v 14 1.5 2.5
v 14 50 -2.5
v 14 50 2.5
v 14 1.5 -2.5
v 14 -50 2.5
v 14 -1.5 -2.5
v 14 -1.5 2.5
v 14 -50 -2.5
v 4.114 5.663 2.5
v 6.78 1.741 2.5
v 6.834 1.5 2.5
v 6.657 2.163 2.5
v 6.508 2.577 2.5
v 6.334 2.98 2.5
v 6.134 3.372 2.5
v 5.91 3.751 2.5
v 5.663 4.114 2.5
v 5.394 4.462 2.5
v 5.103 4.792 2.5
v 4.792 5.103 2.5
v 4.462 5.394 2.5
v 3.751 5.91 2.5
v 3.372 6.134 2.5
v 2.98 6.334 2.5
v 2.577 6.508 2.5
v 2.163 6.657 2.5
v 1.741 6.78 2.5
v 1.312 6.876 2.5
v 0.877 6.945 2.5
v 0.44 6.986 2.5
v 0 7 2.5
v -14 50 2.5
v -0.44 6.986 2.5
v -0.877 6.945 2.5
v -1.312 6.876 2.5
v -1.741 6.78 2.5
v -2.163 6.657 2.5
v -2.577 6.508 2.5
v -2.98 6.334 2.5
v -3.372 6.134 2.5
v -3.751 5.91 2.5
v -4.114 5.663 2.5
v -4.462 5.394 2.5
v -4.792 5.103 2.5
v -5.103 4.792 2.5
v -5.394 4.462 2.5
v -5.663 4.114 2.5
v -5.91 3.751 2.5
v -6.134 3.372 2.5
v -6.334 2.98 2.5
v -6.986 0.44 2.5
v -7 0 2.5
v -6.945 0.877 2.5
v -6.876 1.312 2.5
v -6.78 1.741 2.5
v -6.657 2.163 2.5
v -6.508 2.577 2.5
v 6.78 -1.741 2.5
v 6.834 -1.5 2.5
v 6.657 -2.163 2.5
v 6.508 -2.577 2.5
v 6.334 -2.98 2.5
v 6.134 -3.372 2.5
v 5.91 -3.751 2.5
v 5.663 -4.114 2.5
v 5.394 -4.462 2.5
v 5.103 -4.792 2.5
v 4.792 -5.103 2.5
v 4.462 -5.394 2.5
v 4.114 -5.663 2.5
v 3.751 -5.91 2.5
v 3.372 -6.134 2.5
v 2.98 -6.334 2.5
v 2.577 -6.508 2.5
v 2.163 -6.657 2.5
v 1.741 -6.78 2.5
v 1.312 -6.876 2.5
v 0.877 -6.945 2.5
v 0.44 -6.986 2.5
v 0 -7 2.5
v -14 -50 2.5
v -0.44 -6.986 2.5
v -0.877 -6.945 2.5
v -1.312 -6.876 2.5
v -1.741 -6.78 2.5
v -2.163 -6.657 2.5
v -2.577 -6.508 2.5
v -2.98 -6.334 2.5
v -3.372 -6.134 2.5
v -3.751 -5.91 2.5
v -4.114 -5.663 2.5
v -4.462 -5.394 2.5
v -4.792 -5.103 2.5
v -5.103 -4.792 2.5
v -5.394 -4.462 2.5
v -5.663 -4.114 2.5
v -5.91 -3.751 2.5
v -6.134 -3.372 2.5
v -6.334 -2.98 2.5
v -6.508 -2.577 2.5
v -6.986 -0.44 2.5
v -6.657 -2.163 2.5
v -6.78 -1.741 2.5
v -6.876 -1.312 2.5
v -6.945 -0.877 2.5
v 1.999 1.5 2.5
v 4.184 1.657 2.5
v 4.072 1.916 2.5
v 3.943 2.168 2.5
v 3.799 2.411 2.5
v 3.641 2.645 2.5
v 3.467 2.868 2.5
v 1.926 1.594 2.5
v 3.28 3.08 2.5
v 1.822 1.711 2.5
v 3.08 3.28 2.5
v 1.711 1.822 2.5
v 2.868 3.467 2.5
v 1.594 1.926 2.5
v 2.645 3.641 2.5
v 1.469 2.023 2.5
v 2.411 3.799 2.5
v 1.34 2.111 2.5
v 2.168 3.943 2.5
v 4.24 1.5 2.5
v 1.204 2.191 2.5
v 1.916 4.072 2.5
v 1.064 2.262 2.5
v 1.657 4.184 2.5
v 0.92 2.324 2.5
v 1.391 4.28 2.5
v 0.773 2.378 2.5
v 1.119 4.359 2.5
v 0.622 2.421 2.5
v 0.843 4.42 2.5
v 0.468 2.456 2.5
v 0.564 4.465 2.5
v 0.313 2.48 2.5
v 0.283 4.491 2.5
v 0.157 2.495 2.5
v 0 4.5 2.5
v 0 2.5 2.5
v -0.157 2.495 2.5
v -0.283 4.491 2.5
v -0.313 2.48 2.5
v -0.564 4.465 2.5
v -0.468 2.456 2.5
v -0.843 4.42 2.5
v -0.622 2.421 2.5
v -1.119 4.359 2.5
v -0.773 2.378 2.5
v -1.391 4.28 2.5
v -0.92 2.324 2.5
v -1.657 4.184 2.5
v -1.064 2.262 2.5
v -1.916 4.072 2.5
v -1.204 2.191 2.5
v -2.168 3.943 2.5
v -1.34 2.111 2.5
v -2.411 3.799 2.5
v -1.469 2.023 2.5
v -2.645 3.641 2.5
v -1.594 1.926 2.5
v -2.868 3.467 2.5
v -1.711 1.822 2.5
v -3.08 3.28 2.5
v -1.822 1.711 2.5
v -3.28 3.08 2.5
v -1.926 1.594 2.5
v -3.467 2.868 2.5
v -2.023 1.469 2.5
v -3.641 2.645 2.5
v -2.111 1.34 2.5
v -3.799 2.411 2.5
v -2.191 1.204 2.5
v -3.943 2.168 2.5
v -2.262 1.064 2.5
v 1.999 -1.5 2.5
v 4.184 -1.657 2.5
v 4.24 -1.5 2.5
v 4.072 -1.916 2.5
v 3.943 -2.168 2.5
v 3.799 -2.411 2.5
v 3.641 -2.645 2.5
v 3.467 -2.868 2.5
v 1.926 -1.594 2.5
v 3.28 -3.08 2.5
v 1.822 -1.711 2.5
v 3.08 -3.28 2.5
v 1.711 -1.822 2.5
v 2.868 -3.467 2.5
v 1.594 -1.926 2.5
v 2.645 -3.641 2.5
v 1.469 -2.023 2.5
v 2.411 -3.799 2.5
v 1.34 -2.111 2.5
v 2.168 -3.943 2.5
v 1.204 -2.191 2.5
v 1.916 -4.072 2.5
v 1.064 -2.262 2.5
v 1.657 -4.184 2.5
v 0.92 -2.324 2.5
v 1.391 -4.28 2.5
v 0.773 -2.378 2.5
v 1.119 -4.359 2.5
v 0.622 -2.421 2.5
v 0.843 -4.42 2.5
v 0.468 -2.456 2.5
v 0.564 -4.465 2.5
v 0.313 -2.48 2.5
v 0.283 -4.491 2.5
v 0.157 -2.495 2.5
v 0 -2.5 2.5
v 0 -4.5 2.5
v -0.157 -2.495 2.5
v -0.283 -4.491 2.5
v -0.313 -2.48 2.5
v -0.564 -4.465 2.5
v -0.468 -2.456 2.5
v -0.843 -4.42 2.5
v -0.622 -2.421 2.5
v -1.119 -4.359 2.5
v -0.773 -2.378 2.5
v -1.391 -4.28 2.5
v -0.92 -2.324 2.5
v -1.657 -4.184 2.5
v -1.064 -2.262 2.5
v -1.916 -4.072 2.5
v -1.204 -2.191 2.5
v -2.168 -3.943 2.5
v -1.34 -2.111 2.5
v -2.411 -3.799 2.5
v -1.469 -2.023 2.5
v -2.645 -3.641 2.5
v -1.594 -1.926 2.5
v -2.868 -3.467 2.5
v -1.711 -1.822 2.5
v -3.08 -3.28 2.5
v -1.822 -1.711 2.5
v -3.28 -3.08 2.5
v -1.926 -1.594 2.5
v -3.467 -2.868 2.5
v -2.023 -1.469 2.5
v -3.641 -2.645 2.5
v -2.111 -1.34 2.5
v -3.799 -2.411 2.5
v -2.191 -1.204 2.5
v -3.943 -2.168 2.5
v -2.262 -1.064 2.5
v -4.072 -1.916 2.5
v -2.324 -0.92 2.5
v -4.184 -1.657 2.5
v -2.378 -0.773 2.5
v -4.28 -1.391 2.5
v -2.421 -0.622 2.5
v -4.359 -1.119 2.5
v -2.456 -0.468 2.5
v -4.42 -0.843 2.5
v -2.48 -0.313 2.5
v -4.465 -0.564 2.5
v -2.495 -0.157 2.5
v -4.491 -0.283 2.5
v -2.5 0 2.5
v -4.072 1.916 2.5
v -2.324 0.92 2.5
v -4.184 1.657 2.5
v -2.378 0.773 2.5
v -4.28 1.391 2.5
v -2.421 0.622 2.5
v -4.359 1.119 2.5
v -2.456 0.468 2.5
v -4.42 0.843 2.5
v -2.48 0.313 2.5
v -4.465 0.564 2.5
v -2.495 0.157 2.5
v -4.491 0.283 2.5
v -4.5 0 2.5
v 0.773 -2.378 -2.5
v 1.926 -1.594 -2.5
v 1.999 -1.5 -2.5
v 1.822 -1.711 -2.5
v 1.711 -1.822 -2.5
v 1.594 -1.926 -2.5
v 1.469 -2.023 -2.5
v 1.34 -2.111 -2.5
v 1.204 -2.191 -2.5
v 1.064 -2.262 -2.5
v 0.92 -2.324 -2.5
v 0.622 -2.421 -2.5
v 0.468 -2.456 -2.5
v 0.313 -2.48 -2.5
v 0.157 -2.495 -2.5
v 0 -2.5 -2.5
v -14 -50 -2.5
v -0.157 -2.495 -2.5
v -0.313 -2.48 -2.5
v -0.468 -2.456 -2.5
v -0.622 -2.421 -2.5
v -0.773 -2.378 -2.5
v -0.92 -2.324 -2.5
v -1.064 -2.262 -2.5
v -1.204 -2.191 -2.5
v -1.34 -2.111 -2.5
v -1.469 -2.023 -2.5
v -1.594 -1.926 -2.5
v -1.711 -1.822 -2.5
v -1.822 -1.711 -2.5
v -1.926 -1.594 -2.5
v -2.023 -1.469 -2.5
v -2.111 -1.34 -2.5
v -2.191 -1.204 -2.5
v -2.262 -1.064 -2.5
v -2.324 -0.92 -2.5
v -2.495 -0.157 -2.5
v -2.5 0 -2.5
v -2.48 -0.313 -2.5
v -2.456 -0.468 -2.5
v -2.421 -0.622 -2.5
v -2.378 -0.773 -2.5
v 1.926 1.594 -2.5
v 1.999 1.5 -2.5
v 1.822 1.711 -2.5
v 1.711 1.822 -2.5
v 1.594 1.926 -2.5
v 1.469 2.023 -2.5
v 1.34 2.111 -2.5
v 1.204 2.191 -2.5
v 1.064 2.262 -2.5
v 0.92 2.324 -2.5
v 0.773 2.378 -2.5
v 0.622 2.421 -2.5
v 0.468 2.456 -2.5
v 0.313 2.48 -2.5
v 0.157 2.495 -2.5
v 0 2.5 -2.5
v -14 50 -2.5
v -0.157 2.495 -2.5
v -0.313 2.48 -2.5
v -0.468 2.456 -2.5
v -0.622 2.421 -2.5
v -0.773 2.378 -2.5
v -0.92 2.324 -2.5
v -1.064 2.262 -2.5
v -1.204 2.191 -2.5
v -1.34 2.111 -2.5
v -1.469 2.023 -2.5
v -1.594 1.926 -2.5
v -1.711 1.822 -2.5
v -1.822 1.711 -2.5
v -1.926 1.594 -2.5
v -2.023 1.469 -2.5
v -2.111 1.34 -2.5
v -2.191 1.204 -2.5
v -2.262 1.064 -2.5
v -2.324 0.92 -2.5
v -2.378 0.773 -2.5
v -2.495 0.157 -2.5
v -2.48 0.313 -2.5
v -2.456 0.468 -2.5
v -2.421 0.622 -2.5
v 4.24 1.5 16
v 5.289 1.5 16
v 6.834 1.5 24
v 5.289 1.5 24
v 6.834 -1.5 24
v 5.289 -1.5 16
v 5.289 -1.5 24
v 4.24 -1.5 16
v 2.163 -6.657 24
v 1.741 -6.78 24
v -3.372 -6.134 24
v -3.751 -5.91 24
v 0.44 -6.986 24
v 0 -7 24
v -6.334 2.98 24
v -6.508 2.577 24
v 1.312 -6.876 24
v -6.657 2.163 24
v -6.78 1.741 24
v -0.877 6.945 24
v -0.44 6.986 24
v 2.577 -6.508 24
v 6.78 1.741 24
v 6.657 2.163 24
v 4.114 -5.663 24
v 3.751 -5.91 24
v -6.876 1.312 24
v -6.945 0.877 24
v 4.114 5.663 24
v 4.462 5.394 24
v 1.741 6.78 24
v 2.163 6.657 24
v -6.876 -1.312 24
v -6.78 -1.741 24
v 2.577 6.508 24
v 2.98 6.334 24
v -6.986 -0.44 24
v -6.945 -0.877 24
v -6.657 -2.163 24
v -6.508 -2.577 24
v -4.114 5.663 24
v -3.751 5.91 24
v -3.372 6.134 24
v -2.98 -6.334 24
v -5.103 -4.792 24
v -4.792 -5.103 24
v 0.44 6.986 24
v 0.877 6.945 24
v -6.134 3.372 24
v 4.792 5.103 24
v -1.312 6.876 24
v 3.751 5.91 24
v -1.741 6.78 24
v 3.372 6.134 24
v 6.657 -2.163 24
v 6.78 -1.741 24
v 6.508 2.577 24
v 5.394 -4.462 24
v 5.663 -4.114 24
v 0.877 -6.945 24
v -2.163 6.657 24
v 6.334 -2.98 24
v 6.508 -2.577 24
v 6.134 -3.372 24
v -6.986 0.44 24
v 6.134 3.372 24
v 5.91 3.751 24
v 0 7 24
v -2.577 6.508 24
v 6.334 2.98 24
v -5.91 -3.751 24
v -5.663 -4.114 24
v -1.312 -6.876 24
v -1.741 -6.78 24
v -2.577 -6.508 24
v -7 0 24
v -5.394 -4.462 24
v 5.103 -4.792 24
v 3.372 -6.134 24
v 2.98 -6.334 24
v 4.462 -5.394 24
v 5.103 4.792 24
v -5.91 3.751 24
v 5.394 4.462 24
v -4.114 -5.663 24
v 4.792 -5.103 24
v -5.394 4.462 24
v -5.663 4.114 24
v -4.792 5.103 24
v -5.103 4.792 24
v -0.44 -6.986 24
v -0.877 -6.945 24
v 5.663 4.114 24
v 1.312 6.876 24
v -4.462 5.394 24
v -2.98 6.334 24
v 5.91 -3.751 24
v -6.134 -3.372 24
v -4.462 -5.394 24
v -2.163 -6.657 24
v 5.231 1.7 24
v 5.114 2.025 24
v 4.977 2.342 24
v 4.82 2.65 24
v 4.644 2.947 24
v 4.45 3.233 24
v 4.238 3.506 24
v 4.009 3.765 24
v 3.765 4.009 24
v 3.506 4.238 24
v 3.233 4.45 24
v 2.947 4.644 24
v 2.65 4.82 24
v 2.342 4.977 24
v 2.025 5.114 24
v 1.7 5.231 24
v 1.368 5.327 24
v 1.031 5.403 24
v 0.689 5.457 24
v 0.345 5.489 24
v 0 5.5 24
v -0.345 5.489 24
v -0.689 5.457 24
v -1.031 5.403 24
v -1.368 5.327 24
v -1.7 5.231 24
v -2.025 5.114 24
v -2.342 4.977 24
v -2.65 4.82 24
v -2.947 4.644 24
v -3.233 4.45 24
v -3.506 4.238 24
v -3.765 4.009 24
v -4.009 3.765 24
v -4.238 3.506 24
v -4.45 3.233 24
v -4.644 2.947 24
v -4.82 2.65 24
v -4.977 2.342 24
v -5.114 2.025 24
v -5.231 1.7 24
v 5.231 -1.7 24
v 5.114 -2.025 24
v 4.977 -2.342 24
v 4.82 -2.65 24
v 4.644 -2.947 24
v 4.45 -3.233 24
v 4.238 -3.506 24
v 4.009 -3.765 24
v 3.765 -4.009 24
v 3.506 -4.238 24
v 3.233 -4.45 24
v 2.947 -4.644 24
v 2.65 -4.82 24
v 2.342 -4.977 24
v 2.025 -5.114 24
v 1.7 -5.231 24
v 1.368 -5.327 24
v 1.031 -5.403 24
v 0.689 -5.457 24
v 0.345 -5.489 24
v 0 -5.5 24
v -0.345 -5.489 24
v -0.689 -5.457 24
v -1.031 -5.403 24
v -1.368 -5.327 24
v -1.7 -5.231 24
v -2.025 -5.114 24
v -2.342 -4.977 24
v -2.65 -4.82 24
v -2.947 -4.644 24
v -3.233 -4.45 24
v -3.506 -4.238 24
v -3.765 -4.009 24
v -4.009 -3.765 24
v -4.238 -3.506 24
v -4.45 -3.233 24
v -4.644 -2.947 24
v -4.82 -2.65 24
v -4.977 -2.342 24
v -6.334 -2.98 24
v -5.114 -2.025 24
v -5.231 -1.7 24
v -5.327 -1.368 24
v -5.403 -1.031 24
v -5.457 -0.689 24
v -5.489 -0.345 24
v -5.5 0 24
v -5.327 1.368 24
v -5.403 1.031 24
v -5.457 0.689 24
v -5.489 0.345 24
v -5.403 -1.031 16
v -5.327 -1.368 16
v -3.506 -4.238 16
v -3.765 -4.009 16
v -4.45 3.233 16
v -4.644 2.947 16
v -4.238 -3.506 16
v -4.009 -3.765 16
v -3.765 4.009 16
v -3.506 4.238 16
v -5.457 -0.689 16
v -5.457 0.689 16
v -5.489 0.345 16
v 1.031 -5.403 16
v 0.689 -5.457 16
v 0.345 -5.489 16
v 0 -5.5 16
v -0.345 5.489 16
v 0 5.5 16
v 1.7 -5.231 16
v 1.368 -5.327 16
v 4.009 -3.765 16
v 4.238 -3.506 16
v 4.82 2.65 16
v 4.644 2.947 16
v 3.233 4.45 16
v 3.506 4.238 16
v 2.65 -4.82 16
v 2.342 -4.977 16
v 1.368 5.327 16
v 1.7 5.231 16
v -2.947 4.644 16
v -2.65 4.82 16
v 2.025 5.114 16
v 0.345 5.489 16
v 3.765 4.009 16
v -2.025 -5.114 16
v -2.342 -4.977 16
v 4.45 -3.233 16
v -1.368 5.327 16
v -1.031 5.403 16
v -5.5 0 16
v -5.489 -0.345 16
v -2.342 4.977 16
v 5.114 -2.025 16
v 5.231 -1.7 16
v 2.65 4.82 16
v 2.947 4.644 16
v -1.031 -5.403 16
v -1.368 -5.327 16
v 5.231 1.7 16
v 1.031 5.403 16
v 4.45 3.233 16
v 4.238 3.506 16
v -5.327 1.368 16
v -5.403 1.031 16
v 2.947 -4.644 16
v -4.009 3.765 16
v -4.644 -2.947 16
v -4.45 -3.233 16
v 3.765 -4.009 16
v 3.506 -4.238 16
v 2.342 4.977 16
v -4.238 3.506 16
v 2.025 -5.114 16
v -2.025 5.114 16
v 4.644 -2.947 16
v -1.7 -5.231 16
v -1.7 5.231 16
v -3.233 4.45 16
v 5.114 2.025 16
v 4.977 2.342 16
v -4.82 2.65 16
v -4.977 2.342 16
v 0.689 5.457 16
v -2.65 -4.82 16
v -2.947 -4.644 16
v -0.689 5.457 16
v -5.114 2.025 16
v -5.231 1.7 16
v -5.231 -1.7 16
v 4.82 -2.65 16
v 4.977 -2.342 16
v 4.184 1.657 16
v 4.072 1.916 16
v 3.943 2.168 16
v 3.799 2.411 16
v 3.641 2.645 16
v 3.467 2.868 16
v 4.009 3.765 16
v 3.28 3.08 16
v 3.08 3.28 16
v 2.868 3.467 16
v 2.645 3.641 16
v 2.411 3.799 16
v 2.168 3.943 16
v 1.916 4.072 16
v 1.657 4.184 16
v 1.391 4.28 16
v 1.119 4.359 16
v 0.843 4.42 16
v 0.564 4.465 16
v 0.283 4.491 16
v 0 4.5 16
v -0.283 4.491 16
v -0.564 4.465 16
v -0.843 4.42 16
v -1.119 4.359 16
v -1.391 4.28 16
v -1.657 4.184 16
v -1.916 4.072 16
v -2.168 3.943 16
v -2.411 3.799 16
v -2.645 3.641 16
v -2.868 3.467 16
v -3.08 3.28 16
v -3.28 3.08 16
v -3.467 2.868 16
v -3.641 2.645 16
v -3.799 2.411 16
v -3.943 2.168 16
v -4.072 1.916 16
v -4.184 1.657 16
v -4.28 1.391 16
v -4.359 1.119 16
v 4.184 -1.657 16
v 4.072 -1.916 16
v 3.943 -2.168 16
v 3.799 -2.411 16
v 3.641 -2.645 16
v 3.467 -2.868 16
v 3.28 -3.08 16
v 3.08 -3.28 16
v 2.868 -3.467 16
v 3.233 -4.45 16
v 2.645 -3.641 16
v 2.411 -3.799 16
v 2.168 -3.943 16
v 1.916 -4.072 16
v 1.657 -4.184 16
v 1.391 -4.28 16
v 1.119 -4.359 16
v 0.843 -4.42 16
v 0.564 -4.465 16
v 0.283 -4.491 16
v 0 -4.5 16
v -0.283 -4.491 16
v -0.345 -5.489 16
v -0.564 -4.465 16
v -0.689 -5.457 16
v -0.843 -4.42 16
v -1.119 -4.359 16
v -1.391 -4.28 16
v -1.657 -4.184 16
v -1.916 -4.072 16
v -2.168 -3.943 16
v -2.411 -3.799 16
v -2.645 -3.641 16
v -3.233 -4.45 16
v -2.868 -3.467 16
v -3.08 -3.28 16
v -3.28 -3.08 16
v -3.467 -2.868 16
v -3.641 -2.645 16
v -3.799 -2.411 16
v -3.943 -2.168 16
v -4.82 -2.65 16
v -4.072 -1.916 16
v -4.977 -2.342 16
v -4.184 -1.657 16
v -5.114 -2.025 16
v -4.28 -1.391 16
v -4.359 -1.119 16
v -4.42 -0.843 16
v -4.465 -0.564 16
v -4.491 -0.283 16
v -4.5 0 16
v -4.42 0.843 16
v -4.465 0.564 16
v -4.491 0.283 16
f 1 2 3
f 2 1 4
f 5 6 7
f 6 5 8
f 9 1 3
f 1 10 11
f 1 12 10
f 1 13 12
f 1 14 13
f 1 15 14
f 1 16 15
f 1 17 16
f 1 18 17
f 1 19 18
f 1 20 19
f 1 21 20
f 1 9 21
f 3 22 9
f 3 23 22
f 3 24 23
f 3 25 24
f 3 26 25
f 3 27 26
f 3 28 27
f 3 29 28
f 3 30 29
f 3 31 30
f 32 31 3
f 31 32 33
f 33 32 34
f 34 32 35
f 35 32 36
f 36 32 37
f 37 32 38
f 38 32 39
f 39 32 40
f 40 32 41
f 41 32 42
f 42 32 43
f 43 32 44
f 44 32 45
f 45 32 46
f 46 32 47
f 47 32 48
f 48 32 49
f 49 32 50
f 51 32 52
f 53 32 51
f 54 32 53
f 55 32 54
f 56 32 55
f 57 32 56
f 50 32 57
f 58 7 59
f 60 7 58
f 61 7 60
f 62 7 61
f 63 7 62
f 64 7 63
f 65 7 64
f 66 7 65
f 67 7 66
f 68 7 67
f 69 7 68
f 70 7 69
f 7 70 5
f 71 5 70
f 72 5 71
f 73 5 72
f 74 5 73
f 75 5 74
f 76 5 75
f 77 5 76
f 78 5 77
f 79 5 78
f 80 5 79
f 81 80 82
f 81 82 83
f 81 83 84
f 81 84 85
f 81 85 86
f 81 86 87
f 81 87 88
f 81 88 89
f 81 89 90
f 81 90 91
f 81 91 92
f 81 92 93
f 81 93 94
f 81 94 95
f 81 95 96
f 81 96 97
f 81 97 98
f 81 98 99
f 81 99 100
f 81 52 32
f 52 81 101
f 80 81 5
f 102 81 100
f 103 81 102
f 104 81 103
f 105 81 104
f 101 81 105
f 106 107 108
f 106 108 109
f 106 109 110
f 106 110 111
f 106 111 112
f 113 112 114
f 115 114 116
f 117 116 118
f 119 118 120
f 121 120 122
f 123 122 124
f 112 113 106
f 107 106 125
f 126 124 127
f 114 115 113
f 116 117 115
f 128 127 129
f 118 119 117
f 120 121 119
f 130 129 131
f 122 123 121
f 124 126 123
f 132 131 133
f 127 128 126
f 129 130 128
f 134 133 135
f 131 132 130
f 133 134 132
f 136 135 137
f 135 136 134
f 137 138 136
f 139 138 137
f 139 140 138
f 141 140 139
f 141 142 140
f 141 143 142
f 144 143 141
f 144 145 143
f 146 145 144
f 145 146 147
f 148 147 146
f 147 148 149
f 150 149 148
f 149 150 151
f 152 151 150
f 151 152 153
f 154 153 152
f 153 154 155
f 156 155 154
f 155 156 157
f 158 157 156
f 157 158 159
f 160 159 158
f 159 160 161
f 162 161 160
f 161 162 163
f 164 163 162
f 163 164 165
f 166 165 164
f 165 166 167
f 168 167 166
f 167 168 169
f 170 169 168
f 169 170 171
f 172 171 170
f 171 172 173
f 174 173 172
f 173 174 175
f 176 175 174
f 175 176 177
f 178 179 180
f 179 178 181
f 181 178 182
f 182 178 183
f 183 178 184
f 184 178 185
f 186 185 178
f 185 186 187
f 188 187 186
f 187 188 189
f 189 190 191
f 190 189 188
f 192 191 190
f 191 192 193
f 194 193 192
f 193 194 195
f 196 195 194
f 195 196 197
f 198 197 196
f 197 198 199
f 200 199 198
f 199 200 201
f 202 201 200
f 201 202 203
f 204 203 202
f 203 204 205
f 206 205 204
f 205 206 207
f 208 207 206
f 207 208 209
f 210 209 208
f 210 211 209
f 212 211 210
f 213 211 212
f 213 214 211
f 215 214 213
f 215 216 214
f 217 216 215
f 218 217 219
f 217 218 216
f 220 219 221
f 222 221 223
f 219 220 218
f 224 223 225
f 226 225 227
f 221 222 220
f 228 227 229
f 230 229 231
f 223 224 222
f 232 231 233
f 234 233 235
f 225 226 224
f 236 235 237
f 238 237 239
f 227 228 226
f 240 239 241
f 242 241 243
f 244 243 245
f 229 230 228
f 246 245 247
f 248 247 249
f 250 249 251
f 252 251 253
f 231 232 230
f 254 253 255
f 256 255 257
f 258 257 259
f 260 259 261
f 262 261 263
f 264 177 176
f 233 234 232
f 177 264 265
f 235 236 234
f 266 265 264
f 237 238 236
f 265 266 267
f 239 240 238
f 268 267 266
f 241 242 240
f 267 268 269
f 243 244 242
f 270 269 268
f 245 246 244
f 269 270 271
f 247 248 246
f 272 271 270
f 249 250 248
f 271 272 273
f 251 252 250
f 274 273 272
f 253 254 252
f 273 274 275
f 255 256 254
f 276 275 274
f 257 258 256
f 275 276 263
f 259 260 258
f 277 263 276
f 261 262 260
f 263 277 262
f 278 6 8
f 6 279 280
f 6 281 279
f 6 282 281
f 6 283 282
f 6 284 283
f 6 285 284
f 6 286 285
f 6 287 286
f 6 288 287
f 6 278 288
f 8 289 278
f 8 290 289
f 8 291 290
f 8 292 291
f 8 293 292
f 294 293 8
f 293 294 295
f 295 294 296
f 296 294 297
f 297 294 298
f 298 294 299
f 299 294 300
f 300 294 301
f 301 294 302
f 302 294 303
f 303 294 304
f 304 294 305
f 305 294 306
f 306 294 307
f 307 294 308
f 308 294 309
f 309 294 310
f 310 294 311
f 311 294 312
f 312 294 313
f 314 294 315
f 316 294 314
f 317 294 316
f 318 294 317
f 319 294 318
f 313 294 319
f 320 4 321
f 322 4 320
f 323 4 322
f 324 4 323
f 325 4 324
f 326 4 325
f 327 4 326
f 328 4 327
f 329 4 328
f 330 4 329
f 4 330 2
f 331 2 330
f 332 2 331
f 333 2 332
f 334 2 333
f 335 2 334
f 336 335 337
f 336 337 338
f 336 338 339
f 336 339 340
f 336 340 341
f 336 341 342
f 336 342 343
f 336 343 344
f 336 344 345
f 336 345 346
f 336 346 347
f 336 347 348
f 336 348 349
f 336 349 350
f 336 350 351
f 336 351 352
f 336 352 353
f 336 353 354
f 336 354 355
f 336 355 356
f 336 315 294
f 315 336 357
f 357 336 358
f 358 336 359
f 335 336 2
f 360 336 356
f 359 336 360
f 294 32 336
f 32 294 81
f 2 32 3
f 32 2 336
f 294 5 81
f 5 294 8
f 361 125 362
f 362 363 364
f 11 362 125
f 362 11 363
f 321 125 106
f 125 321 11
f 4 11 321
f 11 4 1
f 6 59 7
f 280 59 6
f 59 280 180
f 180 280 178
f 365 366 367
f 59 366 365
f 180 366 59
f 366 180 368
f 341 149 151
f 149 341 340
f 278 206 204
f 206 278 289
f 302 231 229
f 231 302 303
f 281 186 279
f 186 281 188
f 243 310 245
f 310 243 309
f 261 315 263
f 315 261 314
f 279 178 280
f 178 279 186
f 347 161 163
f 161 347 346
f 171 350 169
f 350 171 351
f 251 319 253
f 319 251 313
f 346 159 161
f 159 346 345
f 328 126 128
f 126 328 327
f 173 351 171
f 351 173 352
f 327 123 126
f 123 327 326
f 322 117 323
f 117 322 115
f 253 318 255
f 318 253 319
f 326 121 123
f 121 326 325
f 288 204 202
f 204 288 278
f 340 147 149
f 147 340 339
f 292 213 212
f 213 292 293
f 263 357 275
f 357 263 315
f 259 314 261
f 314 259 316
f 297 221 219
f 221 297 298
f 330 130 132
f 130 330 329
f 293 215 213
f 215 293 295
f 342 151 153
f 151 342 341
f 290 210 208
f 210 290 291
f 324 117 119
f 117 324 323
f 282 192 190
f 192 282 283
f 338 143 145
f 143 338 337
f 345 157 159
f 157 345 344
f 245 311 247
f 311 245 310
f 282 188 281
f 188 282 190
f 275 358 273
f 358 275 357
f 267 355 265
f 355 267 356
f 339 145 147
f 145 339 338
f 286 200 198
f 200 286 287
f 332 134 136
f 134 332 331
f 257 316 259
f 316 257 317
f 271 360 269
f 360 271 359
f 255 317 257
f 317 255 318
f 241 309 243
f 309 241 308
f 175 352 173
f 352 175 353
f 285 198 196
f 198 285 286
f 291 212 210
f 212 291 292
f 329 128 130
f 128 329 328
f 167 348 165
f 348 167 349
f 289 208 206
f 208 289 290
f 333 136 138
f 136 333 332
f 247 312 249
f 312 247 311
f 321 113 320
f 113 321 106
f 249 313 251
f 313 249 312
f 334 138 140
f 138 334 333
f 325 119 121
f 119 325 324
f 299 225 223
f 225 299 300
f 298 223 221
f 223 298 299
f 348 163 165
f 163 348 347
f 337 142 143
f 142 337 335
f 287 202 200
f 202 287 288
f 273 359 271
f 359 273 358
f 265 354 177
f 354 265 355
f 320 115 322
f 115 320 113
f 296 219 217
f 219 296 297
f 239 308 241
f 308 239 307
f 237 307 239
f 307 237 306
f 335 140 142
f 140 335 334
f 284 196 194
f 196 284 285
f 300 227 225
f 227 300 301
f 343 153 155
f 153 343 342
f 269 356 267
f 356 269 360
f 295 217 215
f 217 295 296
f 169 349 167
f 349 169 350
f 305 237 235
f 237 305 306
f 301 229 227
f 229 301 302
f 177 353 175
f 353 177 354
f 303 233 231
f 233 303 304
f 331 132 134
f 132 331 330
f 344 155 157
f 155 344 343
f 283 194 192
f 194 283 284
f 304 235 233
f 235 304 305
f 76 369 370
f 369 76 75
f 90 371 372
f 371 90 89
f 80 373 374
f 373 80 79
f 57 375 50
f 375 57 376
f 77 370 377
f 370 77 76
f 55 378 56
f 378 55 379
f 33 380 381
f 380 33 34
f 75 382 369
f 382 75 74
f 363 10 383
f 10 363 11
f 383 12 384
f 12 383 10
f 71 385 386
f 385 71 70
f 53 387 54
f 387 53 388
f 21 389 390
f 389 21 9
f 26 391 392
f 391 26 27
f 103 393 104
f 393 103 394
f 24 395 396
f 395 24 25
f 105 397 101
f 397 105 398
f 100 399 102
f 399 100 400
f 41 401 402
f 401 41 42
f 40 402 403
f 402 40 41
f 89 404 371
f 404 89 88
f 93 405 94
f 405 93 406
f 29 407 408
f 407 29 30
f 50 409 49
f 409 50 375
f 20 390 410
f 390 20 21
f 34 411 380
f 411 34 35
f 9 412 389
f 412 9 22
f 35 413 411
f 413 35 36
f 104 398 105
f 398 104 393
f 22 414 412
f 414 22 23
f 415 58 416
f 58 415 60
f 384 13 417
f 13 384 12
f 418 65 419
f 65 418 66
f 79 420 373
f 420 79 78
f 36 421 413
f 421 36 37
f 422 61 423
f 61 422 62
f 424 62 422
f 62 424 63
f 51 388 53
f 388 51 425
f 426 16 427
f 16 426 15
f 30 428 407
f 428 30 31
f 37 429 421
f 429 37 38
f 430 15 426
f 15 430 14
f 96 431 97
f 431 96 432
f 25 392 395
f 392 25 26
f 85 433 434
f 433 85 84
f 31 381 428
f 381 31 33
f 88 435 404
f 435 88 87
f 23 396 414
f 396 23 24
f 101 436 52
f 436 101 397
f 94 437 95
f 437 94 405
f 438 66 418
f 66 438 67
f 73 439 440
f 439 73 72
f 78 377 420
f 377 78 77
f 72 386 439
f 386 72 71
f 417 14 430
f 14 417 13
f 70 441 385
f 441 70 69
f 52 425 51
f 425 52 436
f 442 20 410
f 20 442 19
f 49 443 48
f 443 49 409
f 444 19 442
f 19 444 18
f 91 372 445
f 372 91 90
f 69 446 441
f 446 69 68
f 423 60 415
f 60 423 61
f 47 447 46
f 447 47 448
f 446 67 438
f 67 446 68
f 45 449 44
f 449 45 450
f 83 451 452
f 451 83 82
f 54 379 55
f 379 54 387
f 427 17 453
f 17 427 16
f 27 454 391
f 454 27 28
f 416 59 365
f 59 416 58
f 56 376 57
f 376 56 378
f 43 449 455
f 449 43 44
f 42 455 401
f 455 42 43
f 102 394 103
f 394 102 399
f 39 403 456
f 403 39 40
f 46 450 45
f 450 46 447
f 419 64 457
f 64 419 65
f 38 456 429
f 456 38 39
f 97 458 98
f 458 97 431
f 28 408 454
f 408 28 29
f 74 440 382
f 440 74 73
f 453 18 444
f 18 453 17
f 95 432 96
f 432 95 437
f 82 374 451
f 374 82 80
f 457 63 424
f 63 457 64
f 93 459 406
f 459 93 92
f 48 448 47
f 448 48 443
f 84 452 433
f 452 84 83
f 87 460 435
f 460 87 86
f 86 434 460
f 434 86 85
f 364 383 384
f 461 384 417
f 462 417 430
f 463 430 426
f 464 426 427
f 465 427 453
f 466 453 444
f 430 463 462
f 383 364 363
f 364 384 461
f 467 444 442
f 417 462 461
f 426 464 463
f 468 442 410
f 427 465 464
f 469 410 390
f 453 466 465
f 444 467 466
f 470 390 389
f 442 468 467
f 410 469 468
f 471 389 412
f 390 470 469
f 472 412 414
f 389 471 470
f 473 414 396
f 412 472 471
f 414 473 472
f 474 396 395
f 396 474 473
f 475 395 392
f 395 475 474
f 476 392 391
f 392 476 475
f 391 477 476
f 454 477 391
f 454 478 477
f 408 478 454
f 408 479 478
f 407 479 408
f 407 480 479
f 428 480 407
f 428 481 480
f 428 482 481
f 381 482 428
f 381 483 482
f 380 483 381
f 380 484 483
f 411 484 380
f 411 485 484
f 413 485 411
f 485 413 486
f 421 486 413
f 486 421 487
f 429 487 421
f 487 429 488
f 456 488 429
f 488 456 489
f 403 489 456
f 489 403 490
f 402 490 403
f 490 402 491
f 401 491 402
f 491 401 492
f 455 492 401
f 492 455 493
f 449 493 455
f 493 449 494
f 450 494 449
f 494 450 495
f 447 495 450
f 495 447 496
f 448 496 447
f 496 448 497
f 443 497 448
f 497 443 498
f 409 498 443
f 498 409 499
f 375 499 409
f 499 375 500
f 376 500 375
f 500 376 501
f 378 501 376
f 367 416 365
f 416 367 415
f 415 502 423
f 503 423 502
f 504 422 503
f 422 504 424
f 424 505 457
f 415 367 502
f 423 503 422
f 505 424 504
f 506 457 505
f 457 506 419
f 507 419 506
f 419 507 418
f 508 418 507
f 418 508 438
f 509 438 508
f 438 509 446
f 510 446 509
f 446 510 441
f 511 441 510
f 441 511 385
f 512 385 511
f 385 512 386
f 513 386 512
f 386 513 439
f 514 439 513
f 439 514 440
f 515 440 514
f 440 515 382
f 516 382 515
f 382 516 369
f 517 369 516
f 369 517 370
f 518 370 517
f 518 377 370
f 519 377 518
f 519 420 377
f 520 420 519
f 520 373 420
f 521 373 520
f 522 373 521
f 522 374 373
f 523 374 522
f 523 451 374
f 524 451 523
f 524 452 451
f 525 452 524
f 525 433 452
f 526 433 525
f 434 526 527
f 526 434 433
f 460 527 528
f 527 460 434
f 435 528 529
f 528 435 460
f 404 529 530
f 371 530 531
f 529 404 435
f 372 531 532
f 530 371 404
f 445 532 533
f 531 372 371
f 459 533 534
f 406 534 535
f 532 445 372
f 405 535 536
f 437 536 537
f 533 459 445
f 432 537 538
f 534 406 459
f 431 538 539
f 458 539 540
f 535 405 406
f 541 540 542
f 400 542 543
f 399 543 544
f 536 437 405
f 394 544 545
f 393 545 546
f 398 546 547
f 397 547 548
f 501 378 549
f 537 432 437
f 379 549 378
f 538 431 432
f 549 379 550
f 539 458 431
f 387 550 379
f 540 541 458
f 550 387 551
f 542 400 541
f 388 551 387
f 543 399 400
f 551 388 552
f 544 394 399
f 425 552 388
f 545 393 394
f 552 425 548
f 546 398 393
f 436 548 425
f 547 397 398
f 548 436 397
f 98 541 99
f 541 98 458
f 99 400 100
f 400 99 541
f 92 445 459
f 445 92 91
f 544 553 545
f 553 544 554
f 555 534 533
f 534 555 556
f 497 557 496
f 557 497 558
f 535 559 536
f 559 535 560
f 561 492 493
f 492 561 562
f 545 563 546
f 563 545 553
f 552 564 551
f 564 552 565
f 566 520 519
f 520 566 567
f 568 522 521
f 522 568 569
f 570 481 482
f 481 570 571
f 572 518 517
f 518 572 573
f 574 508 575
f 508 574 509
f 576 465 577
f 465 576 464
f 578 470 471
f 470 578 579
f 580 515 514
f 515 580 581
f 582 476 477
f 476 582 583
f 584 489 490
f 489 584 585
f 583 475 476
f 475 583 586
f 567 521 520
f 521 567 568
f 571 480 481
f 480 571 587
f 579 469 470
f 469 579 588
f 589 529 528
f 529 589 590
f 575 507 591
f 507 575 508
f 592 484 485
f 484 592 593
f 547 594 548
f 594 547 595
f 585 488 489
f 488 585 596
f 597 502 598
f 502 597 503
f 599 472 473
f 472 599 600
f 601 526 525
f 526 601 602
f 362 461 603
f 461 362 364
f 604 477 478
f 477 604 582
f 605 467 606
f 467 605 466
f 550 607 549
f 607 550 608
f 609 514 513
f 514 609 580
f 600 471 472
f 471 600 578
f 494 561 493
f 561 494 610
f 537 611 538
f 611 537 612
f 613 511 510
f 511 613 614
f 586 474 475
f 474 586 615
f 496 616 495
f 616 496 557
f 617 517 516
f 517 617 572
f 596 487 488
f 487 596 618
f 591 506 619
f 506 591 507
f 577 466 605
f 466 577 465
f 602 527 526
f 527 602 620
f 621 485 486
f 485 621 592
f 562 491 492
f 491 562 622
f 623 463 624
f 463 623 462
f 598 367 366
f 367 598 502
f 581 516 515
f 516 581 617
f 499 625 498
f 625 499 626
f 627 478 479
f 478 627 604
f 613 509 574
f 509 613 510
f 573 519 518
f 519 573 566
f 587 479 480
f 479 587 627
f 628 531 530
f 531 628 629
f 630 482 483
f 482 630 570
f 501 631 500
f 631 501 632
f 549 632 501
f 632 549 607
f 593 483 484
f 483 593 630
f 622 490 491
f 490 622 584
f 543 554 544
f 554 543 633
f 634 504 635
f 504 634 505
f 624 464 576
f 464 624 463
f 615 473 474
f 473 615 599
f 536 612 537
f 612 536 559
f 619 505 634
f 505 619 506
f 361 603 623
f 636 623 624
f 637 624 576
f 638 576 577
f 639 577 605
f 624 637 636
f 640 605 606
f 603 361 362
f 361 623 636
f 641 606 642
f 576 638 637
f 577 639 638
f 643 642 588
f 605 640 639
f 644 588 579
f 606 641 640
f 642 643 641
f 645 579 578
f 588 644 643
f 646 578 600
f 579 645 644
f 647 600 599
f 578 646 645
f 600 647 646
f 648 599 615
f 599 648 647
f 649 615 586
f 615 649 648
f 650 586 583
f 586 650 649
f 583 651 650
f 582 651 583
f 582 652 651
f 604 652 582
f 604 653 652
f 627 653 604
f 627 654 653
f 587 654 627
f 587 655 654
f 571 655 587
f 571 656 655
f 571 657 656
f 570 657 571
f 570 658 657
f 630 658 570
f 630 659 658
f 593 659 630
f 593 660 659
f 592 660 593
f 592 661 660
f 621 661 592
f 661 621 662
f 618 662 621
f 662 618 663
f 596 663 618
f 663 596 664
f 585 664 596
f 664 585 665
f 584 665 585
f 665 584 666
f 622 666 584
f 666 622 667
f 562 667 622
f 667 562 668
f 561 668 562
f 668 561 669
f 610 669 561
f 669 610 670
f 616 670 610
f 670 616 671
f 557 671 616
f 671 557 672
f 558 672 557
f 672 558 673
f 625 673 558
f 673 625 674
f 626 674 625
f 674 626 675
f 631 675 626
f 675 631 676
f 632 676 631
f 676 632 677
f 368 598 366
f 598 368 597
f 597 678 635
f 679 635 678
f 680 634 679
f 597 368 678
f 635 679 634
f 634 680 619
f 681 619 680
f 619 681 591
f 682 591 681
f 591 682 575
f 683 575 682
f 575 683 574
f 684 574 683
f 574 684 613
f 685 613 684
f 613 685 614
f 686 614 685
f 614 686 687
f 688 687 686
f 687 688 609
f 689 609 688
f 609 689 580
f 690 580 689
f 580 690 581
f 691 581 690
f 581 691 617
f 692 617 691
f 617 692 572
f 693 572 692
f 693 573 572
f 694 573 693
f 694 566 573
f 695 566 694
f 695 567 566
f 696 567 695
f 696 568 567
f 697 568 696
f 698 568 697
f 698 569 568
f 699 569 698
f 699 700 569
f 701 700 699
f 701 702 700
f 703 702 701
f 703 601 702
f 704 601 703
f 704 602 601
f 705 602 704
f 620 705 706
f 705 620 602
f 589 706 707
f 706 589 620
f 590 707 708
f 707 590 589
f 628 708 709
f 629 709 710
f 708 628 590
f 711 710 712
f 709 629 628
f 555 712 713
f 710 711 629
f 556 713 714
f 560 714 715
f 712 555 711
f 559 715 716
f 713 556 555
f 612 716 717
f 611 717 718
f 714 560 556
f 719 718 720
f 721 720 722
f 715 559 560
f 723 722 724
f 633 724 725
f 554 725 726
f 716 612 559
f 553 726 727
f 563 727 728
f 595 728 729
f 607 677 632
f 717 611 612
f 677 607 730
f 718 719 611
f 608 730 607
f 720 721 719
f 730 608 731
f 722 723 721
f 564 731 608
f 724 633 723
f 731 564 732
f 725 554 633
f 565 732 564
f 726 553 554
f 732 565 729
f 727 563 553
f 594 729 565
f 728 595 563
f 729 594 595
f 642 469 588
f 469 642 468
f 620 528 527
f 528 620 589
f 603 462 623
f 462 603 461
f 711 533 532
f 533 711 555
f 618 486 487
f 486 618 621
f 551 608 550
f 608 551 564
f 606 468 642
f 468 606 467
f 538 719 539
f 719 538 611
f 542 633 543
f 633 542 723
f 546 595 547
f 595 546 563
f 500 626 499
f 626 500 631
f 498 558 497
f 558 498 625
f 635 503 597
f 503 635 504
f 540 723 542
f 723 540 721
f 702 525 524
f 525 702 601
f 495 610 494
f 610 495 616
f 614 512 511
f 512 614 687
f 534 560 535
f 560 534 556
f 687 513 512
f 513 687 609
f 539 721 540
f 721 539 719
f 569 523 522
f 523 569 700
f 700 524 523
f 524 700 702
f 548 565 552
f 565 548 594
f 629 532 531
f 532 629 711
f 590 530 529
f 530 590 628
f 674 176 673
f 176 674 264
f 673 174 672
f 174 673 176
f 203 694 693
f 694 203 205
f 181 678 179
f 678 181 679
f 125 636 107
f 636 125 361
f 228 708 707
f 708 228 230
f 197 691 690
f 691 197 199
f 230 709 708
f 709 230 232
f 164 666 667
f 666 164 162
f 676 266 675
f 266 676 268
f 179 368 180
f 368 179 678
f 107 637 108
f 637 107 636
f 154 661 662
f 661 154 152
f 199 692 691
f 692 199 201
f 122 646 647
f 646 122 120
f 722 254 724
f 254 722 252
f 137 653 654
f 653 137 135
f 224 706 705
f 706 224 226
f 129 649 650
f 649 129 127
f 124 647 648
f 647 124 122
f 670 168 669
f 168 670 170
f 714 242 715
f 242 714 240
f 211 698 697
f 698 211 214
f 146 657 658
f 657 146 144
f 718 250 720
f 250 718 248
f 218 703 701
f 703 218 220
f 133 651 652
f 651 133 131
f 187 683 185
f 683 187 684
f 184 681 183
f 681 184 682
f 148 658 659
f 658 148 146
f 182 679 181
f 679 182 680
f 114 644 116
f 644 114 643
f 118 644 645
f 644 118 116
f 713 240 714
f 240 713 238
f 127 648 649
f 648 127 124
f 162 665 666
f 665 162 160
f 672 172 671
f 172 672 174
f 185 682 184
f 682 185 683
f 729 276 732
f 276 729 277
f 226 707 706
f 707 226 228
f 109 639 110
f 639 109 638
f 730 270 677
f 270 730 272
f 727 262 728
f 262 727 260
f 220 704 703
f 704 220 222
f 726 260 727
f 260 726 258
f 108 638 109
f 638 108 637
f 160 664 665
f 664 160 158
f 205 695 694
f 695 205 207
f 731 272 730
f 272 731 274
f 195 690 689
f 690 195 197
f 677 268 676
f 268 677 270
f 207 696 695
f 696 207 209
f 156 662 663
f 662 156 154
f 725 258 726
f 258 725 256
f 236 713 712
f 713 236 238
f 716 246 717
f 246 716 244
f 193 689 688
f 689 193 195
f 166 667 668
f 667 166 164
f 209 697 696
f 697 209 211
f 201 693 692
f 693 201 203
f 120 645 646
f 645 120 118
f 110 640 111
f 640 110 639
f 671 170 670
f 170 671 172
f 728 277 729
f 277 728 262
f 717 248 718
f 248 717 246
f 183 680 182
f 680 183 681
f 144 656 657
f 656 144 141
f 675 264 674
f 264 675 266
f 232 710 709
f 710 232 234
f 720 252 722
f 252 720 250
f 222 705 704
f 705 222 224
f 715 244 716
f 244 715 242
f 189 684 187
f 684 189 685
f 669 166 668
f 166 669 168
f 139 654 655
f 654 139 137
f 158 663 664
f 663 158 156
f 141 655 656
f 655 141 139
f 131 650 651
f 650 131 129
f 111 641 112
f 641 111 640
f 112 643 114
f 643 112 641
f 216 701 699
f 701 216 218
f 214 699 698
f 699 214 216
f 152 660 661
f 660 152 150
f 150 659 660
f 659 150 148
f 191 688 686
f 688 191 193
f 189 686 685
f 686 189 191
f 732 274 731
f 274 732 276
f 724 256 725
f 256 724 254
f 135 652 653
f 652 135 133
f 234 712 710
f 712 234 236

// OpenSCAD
difference(){
cube([28,100,5],center=true);
     translate ([10,0,0]){cube([20,3,100], center=true);}
     cylinder(h=100, r=2.5, center=true, $fn=100);}
difference() {
            translate([0,0,13]){cylinder(h=22,r=7, center=true, $fn=100);} 
            translate([0,0,20])cylinder(h=8, r=5.5, center=true, $fn=100);
            cylinder(h=100, r=2.5, center=true, $fn=100);
            translate ([10,0,0]){cube([20,3,100], center=true);}
            translate([0,0,9]) cylinder(h=14,r=4.5, center=true, $fn=100);} 
           
